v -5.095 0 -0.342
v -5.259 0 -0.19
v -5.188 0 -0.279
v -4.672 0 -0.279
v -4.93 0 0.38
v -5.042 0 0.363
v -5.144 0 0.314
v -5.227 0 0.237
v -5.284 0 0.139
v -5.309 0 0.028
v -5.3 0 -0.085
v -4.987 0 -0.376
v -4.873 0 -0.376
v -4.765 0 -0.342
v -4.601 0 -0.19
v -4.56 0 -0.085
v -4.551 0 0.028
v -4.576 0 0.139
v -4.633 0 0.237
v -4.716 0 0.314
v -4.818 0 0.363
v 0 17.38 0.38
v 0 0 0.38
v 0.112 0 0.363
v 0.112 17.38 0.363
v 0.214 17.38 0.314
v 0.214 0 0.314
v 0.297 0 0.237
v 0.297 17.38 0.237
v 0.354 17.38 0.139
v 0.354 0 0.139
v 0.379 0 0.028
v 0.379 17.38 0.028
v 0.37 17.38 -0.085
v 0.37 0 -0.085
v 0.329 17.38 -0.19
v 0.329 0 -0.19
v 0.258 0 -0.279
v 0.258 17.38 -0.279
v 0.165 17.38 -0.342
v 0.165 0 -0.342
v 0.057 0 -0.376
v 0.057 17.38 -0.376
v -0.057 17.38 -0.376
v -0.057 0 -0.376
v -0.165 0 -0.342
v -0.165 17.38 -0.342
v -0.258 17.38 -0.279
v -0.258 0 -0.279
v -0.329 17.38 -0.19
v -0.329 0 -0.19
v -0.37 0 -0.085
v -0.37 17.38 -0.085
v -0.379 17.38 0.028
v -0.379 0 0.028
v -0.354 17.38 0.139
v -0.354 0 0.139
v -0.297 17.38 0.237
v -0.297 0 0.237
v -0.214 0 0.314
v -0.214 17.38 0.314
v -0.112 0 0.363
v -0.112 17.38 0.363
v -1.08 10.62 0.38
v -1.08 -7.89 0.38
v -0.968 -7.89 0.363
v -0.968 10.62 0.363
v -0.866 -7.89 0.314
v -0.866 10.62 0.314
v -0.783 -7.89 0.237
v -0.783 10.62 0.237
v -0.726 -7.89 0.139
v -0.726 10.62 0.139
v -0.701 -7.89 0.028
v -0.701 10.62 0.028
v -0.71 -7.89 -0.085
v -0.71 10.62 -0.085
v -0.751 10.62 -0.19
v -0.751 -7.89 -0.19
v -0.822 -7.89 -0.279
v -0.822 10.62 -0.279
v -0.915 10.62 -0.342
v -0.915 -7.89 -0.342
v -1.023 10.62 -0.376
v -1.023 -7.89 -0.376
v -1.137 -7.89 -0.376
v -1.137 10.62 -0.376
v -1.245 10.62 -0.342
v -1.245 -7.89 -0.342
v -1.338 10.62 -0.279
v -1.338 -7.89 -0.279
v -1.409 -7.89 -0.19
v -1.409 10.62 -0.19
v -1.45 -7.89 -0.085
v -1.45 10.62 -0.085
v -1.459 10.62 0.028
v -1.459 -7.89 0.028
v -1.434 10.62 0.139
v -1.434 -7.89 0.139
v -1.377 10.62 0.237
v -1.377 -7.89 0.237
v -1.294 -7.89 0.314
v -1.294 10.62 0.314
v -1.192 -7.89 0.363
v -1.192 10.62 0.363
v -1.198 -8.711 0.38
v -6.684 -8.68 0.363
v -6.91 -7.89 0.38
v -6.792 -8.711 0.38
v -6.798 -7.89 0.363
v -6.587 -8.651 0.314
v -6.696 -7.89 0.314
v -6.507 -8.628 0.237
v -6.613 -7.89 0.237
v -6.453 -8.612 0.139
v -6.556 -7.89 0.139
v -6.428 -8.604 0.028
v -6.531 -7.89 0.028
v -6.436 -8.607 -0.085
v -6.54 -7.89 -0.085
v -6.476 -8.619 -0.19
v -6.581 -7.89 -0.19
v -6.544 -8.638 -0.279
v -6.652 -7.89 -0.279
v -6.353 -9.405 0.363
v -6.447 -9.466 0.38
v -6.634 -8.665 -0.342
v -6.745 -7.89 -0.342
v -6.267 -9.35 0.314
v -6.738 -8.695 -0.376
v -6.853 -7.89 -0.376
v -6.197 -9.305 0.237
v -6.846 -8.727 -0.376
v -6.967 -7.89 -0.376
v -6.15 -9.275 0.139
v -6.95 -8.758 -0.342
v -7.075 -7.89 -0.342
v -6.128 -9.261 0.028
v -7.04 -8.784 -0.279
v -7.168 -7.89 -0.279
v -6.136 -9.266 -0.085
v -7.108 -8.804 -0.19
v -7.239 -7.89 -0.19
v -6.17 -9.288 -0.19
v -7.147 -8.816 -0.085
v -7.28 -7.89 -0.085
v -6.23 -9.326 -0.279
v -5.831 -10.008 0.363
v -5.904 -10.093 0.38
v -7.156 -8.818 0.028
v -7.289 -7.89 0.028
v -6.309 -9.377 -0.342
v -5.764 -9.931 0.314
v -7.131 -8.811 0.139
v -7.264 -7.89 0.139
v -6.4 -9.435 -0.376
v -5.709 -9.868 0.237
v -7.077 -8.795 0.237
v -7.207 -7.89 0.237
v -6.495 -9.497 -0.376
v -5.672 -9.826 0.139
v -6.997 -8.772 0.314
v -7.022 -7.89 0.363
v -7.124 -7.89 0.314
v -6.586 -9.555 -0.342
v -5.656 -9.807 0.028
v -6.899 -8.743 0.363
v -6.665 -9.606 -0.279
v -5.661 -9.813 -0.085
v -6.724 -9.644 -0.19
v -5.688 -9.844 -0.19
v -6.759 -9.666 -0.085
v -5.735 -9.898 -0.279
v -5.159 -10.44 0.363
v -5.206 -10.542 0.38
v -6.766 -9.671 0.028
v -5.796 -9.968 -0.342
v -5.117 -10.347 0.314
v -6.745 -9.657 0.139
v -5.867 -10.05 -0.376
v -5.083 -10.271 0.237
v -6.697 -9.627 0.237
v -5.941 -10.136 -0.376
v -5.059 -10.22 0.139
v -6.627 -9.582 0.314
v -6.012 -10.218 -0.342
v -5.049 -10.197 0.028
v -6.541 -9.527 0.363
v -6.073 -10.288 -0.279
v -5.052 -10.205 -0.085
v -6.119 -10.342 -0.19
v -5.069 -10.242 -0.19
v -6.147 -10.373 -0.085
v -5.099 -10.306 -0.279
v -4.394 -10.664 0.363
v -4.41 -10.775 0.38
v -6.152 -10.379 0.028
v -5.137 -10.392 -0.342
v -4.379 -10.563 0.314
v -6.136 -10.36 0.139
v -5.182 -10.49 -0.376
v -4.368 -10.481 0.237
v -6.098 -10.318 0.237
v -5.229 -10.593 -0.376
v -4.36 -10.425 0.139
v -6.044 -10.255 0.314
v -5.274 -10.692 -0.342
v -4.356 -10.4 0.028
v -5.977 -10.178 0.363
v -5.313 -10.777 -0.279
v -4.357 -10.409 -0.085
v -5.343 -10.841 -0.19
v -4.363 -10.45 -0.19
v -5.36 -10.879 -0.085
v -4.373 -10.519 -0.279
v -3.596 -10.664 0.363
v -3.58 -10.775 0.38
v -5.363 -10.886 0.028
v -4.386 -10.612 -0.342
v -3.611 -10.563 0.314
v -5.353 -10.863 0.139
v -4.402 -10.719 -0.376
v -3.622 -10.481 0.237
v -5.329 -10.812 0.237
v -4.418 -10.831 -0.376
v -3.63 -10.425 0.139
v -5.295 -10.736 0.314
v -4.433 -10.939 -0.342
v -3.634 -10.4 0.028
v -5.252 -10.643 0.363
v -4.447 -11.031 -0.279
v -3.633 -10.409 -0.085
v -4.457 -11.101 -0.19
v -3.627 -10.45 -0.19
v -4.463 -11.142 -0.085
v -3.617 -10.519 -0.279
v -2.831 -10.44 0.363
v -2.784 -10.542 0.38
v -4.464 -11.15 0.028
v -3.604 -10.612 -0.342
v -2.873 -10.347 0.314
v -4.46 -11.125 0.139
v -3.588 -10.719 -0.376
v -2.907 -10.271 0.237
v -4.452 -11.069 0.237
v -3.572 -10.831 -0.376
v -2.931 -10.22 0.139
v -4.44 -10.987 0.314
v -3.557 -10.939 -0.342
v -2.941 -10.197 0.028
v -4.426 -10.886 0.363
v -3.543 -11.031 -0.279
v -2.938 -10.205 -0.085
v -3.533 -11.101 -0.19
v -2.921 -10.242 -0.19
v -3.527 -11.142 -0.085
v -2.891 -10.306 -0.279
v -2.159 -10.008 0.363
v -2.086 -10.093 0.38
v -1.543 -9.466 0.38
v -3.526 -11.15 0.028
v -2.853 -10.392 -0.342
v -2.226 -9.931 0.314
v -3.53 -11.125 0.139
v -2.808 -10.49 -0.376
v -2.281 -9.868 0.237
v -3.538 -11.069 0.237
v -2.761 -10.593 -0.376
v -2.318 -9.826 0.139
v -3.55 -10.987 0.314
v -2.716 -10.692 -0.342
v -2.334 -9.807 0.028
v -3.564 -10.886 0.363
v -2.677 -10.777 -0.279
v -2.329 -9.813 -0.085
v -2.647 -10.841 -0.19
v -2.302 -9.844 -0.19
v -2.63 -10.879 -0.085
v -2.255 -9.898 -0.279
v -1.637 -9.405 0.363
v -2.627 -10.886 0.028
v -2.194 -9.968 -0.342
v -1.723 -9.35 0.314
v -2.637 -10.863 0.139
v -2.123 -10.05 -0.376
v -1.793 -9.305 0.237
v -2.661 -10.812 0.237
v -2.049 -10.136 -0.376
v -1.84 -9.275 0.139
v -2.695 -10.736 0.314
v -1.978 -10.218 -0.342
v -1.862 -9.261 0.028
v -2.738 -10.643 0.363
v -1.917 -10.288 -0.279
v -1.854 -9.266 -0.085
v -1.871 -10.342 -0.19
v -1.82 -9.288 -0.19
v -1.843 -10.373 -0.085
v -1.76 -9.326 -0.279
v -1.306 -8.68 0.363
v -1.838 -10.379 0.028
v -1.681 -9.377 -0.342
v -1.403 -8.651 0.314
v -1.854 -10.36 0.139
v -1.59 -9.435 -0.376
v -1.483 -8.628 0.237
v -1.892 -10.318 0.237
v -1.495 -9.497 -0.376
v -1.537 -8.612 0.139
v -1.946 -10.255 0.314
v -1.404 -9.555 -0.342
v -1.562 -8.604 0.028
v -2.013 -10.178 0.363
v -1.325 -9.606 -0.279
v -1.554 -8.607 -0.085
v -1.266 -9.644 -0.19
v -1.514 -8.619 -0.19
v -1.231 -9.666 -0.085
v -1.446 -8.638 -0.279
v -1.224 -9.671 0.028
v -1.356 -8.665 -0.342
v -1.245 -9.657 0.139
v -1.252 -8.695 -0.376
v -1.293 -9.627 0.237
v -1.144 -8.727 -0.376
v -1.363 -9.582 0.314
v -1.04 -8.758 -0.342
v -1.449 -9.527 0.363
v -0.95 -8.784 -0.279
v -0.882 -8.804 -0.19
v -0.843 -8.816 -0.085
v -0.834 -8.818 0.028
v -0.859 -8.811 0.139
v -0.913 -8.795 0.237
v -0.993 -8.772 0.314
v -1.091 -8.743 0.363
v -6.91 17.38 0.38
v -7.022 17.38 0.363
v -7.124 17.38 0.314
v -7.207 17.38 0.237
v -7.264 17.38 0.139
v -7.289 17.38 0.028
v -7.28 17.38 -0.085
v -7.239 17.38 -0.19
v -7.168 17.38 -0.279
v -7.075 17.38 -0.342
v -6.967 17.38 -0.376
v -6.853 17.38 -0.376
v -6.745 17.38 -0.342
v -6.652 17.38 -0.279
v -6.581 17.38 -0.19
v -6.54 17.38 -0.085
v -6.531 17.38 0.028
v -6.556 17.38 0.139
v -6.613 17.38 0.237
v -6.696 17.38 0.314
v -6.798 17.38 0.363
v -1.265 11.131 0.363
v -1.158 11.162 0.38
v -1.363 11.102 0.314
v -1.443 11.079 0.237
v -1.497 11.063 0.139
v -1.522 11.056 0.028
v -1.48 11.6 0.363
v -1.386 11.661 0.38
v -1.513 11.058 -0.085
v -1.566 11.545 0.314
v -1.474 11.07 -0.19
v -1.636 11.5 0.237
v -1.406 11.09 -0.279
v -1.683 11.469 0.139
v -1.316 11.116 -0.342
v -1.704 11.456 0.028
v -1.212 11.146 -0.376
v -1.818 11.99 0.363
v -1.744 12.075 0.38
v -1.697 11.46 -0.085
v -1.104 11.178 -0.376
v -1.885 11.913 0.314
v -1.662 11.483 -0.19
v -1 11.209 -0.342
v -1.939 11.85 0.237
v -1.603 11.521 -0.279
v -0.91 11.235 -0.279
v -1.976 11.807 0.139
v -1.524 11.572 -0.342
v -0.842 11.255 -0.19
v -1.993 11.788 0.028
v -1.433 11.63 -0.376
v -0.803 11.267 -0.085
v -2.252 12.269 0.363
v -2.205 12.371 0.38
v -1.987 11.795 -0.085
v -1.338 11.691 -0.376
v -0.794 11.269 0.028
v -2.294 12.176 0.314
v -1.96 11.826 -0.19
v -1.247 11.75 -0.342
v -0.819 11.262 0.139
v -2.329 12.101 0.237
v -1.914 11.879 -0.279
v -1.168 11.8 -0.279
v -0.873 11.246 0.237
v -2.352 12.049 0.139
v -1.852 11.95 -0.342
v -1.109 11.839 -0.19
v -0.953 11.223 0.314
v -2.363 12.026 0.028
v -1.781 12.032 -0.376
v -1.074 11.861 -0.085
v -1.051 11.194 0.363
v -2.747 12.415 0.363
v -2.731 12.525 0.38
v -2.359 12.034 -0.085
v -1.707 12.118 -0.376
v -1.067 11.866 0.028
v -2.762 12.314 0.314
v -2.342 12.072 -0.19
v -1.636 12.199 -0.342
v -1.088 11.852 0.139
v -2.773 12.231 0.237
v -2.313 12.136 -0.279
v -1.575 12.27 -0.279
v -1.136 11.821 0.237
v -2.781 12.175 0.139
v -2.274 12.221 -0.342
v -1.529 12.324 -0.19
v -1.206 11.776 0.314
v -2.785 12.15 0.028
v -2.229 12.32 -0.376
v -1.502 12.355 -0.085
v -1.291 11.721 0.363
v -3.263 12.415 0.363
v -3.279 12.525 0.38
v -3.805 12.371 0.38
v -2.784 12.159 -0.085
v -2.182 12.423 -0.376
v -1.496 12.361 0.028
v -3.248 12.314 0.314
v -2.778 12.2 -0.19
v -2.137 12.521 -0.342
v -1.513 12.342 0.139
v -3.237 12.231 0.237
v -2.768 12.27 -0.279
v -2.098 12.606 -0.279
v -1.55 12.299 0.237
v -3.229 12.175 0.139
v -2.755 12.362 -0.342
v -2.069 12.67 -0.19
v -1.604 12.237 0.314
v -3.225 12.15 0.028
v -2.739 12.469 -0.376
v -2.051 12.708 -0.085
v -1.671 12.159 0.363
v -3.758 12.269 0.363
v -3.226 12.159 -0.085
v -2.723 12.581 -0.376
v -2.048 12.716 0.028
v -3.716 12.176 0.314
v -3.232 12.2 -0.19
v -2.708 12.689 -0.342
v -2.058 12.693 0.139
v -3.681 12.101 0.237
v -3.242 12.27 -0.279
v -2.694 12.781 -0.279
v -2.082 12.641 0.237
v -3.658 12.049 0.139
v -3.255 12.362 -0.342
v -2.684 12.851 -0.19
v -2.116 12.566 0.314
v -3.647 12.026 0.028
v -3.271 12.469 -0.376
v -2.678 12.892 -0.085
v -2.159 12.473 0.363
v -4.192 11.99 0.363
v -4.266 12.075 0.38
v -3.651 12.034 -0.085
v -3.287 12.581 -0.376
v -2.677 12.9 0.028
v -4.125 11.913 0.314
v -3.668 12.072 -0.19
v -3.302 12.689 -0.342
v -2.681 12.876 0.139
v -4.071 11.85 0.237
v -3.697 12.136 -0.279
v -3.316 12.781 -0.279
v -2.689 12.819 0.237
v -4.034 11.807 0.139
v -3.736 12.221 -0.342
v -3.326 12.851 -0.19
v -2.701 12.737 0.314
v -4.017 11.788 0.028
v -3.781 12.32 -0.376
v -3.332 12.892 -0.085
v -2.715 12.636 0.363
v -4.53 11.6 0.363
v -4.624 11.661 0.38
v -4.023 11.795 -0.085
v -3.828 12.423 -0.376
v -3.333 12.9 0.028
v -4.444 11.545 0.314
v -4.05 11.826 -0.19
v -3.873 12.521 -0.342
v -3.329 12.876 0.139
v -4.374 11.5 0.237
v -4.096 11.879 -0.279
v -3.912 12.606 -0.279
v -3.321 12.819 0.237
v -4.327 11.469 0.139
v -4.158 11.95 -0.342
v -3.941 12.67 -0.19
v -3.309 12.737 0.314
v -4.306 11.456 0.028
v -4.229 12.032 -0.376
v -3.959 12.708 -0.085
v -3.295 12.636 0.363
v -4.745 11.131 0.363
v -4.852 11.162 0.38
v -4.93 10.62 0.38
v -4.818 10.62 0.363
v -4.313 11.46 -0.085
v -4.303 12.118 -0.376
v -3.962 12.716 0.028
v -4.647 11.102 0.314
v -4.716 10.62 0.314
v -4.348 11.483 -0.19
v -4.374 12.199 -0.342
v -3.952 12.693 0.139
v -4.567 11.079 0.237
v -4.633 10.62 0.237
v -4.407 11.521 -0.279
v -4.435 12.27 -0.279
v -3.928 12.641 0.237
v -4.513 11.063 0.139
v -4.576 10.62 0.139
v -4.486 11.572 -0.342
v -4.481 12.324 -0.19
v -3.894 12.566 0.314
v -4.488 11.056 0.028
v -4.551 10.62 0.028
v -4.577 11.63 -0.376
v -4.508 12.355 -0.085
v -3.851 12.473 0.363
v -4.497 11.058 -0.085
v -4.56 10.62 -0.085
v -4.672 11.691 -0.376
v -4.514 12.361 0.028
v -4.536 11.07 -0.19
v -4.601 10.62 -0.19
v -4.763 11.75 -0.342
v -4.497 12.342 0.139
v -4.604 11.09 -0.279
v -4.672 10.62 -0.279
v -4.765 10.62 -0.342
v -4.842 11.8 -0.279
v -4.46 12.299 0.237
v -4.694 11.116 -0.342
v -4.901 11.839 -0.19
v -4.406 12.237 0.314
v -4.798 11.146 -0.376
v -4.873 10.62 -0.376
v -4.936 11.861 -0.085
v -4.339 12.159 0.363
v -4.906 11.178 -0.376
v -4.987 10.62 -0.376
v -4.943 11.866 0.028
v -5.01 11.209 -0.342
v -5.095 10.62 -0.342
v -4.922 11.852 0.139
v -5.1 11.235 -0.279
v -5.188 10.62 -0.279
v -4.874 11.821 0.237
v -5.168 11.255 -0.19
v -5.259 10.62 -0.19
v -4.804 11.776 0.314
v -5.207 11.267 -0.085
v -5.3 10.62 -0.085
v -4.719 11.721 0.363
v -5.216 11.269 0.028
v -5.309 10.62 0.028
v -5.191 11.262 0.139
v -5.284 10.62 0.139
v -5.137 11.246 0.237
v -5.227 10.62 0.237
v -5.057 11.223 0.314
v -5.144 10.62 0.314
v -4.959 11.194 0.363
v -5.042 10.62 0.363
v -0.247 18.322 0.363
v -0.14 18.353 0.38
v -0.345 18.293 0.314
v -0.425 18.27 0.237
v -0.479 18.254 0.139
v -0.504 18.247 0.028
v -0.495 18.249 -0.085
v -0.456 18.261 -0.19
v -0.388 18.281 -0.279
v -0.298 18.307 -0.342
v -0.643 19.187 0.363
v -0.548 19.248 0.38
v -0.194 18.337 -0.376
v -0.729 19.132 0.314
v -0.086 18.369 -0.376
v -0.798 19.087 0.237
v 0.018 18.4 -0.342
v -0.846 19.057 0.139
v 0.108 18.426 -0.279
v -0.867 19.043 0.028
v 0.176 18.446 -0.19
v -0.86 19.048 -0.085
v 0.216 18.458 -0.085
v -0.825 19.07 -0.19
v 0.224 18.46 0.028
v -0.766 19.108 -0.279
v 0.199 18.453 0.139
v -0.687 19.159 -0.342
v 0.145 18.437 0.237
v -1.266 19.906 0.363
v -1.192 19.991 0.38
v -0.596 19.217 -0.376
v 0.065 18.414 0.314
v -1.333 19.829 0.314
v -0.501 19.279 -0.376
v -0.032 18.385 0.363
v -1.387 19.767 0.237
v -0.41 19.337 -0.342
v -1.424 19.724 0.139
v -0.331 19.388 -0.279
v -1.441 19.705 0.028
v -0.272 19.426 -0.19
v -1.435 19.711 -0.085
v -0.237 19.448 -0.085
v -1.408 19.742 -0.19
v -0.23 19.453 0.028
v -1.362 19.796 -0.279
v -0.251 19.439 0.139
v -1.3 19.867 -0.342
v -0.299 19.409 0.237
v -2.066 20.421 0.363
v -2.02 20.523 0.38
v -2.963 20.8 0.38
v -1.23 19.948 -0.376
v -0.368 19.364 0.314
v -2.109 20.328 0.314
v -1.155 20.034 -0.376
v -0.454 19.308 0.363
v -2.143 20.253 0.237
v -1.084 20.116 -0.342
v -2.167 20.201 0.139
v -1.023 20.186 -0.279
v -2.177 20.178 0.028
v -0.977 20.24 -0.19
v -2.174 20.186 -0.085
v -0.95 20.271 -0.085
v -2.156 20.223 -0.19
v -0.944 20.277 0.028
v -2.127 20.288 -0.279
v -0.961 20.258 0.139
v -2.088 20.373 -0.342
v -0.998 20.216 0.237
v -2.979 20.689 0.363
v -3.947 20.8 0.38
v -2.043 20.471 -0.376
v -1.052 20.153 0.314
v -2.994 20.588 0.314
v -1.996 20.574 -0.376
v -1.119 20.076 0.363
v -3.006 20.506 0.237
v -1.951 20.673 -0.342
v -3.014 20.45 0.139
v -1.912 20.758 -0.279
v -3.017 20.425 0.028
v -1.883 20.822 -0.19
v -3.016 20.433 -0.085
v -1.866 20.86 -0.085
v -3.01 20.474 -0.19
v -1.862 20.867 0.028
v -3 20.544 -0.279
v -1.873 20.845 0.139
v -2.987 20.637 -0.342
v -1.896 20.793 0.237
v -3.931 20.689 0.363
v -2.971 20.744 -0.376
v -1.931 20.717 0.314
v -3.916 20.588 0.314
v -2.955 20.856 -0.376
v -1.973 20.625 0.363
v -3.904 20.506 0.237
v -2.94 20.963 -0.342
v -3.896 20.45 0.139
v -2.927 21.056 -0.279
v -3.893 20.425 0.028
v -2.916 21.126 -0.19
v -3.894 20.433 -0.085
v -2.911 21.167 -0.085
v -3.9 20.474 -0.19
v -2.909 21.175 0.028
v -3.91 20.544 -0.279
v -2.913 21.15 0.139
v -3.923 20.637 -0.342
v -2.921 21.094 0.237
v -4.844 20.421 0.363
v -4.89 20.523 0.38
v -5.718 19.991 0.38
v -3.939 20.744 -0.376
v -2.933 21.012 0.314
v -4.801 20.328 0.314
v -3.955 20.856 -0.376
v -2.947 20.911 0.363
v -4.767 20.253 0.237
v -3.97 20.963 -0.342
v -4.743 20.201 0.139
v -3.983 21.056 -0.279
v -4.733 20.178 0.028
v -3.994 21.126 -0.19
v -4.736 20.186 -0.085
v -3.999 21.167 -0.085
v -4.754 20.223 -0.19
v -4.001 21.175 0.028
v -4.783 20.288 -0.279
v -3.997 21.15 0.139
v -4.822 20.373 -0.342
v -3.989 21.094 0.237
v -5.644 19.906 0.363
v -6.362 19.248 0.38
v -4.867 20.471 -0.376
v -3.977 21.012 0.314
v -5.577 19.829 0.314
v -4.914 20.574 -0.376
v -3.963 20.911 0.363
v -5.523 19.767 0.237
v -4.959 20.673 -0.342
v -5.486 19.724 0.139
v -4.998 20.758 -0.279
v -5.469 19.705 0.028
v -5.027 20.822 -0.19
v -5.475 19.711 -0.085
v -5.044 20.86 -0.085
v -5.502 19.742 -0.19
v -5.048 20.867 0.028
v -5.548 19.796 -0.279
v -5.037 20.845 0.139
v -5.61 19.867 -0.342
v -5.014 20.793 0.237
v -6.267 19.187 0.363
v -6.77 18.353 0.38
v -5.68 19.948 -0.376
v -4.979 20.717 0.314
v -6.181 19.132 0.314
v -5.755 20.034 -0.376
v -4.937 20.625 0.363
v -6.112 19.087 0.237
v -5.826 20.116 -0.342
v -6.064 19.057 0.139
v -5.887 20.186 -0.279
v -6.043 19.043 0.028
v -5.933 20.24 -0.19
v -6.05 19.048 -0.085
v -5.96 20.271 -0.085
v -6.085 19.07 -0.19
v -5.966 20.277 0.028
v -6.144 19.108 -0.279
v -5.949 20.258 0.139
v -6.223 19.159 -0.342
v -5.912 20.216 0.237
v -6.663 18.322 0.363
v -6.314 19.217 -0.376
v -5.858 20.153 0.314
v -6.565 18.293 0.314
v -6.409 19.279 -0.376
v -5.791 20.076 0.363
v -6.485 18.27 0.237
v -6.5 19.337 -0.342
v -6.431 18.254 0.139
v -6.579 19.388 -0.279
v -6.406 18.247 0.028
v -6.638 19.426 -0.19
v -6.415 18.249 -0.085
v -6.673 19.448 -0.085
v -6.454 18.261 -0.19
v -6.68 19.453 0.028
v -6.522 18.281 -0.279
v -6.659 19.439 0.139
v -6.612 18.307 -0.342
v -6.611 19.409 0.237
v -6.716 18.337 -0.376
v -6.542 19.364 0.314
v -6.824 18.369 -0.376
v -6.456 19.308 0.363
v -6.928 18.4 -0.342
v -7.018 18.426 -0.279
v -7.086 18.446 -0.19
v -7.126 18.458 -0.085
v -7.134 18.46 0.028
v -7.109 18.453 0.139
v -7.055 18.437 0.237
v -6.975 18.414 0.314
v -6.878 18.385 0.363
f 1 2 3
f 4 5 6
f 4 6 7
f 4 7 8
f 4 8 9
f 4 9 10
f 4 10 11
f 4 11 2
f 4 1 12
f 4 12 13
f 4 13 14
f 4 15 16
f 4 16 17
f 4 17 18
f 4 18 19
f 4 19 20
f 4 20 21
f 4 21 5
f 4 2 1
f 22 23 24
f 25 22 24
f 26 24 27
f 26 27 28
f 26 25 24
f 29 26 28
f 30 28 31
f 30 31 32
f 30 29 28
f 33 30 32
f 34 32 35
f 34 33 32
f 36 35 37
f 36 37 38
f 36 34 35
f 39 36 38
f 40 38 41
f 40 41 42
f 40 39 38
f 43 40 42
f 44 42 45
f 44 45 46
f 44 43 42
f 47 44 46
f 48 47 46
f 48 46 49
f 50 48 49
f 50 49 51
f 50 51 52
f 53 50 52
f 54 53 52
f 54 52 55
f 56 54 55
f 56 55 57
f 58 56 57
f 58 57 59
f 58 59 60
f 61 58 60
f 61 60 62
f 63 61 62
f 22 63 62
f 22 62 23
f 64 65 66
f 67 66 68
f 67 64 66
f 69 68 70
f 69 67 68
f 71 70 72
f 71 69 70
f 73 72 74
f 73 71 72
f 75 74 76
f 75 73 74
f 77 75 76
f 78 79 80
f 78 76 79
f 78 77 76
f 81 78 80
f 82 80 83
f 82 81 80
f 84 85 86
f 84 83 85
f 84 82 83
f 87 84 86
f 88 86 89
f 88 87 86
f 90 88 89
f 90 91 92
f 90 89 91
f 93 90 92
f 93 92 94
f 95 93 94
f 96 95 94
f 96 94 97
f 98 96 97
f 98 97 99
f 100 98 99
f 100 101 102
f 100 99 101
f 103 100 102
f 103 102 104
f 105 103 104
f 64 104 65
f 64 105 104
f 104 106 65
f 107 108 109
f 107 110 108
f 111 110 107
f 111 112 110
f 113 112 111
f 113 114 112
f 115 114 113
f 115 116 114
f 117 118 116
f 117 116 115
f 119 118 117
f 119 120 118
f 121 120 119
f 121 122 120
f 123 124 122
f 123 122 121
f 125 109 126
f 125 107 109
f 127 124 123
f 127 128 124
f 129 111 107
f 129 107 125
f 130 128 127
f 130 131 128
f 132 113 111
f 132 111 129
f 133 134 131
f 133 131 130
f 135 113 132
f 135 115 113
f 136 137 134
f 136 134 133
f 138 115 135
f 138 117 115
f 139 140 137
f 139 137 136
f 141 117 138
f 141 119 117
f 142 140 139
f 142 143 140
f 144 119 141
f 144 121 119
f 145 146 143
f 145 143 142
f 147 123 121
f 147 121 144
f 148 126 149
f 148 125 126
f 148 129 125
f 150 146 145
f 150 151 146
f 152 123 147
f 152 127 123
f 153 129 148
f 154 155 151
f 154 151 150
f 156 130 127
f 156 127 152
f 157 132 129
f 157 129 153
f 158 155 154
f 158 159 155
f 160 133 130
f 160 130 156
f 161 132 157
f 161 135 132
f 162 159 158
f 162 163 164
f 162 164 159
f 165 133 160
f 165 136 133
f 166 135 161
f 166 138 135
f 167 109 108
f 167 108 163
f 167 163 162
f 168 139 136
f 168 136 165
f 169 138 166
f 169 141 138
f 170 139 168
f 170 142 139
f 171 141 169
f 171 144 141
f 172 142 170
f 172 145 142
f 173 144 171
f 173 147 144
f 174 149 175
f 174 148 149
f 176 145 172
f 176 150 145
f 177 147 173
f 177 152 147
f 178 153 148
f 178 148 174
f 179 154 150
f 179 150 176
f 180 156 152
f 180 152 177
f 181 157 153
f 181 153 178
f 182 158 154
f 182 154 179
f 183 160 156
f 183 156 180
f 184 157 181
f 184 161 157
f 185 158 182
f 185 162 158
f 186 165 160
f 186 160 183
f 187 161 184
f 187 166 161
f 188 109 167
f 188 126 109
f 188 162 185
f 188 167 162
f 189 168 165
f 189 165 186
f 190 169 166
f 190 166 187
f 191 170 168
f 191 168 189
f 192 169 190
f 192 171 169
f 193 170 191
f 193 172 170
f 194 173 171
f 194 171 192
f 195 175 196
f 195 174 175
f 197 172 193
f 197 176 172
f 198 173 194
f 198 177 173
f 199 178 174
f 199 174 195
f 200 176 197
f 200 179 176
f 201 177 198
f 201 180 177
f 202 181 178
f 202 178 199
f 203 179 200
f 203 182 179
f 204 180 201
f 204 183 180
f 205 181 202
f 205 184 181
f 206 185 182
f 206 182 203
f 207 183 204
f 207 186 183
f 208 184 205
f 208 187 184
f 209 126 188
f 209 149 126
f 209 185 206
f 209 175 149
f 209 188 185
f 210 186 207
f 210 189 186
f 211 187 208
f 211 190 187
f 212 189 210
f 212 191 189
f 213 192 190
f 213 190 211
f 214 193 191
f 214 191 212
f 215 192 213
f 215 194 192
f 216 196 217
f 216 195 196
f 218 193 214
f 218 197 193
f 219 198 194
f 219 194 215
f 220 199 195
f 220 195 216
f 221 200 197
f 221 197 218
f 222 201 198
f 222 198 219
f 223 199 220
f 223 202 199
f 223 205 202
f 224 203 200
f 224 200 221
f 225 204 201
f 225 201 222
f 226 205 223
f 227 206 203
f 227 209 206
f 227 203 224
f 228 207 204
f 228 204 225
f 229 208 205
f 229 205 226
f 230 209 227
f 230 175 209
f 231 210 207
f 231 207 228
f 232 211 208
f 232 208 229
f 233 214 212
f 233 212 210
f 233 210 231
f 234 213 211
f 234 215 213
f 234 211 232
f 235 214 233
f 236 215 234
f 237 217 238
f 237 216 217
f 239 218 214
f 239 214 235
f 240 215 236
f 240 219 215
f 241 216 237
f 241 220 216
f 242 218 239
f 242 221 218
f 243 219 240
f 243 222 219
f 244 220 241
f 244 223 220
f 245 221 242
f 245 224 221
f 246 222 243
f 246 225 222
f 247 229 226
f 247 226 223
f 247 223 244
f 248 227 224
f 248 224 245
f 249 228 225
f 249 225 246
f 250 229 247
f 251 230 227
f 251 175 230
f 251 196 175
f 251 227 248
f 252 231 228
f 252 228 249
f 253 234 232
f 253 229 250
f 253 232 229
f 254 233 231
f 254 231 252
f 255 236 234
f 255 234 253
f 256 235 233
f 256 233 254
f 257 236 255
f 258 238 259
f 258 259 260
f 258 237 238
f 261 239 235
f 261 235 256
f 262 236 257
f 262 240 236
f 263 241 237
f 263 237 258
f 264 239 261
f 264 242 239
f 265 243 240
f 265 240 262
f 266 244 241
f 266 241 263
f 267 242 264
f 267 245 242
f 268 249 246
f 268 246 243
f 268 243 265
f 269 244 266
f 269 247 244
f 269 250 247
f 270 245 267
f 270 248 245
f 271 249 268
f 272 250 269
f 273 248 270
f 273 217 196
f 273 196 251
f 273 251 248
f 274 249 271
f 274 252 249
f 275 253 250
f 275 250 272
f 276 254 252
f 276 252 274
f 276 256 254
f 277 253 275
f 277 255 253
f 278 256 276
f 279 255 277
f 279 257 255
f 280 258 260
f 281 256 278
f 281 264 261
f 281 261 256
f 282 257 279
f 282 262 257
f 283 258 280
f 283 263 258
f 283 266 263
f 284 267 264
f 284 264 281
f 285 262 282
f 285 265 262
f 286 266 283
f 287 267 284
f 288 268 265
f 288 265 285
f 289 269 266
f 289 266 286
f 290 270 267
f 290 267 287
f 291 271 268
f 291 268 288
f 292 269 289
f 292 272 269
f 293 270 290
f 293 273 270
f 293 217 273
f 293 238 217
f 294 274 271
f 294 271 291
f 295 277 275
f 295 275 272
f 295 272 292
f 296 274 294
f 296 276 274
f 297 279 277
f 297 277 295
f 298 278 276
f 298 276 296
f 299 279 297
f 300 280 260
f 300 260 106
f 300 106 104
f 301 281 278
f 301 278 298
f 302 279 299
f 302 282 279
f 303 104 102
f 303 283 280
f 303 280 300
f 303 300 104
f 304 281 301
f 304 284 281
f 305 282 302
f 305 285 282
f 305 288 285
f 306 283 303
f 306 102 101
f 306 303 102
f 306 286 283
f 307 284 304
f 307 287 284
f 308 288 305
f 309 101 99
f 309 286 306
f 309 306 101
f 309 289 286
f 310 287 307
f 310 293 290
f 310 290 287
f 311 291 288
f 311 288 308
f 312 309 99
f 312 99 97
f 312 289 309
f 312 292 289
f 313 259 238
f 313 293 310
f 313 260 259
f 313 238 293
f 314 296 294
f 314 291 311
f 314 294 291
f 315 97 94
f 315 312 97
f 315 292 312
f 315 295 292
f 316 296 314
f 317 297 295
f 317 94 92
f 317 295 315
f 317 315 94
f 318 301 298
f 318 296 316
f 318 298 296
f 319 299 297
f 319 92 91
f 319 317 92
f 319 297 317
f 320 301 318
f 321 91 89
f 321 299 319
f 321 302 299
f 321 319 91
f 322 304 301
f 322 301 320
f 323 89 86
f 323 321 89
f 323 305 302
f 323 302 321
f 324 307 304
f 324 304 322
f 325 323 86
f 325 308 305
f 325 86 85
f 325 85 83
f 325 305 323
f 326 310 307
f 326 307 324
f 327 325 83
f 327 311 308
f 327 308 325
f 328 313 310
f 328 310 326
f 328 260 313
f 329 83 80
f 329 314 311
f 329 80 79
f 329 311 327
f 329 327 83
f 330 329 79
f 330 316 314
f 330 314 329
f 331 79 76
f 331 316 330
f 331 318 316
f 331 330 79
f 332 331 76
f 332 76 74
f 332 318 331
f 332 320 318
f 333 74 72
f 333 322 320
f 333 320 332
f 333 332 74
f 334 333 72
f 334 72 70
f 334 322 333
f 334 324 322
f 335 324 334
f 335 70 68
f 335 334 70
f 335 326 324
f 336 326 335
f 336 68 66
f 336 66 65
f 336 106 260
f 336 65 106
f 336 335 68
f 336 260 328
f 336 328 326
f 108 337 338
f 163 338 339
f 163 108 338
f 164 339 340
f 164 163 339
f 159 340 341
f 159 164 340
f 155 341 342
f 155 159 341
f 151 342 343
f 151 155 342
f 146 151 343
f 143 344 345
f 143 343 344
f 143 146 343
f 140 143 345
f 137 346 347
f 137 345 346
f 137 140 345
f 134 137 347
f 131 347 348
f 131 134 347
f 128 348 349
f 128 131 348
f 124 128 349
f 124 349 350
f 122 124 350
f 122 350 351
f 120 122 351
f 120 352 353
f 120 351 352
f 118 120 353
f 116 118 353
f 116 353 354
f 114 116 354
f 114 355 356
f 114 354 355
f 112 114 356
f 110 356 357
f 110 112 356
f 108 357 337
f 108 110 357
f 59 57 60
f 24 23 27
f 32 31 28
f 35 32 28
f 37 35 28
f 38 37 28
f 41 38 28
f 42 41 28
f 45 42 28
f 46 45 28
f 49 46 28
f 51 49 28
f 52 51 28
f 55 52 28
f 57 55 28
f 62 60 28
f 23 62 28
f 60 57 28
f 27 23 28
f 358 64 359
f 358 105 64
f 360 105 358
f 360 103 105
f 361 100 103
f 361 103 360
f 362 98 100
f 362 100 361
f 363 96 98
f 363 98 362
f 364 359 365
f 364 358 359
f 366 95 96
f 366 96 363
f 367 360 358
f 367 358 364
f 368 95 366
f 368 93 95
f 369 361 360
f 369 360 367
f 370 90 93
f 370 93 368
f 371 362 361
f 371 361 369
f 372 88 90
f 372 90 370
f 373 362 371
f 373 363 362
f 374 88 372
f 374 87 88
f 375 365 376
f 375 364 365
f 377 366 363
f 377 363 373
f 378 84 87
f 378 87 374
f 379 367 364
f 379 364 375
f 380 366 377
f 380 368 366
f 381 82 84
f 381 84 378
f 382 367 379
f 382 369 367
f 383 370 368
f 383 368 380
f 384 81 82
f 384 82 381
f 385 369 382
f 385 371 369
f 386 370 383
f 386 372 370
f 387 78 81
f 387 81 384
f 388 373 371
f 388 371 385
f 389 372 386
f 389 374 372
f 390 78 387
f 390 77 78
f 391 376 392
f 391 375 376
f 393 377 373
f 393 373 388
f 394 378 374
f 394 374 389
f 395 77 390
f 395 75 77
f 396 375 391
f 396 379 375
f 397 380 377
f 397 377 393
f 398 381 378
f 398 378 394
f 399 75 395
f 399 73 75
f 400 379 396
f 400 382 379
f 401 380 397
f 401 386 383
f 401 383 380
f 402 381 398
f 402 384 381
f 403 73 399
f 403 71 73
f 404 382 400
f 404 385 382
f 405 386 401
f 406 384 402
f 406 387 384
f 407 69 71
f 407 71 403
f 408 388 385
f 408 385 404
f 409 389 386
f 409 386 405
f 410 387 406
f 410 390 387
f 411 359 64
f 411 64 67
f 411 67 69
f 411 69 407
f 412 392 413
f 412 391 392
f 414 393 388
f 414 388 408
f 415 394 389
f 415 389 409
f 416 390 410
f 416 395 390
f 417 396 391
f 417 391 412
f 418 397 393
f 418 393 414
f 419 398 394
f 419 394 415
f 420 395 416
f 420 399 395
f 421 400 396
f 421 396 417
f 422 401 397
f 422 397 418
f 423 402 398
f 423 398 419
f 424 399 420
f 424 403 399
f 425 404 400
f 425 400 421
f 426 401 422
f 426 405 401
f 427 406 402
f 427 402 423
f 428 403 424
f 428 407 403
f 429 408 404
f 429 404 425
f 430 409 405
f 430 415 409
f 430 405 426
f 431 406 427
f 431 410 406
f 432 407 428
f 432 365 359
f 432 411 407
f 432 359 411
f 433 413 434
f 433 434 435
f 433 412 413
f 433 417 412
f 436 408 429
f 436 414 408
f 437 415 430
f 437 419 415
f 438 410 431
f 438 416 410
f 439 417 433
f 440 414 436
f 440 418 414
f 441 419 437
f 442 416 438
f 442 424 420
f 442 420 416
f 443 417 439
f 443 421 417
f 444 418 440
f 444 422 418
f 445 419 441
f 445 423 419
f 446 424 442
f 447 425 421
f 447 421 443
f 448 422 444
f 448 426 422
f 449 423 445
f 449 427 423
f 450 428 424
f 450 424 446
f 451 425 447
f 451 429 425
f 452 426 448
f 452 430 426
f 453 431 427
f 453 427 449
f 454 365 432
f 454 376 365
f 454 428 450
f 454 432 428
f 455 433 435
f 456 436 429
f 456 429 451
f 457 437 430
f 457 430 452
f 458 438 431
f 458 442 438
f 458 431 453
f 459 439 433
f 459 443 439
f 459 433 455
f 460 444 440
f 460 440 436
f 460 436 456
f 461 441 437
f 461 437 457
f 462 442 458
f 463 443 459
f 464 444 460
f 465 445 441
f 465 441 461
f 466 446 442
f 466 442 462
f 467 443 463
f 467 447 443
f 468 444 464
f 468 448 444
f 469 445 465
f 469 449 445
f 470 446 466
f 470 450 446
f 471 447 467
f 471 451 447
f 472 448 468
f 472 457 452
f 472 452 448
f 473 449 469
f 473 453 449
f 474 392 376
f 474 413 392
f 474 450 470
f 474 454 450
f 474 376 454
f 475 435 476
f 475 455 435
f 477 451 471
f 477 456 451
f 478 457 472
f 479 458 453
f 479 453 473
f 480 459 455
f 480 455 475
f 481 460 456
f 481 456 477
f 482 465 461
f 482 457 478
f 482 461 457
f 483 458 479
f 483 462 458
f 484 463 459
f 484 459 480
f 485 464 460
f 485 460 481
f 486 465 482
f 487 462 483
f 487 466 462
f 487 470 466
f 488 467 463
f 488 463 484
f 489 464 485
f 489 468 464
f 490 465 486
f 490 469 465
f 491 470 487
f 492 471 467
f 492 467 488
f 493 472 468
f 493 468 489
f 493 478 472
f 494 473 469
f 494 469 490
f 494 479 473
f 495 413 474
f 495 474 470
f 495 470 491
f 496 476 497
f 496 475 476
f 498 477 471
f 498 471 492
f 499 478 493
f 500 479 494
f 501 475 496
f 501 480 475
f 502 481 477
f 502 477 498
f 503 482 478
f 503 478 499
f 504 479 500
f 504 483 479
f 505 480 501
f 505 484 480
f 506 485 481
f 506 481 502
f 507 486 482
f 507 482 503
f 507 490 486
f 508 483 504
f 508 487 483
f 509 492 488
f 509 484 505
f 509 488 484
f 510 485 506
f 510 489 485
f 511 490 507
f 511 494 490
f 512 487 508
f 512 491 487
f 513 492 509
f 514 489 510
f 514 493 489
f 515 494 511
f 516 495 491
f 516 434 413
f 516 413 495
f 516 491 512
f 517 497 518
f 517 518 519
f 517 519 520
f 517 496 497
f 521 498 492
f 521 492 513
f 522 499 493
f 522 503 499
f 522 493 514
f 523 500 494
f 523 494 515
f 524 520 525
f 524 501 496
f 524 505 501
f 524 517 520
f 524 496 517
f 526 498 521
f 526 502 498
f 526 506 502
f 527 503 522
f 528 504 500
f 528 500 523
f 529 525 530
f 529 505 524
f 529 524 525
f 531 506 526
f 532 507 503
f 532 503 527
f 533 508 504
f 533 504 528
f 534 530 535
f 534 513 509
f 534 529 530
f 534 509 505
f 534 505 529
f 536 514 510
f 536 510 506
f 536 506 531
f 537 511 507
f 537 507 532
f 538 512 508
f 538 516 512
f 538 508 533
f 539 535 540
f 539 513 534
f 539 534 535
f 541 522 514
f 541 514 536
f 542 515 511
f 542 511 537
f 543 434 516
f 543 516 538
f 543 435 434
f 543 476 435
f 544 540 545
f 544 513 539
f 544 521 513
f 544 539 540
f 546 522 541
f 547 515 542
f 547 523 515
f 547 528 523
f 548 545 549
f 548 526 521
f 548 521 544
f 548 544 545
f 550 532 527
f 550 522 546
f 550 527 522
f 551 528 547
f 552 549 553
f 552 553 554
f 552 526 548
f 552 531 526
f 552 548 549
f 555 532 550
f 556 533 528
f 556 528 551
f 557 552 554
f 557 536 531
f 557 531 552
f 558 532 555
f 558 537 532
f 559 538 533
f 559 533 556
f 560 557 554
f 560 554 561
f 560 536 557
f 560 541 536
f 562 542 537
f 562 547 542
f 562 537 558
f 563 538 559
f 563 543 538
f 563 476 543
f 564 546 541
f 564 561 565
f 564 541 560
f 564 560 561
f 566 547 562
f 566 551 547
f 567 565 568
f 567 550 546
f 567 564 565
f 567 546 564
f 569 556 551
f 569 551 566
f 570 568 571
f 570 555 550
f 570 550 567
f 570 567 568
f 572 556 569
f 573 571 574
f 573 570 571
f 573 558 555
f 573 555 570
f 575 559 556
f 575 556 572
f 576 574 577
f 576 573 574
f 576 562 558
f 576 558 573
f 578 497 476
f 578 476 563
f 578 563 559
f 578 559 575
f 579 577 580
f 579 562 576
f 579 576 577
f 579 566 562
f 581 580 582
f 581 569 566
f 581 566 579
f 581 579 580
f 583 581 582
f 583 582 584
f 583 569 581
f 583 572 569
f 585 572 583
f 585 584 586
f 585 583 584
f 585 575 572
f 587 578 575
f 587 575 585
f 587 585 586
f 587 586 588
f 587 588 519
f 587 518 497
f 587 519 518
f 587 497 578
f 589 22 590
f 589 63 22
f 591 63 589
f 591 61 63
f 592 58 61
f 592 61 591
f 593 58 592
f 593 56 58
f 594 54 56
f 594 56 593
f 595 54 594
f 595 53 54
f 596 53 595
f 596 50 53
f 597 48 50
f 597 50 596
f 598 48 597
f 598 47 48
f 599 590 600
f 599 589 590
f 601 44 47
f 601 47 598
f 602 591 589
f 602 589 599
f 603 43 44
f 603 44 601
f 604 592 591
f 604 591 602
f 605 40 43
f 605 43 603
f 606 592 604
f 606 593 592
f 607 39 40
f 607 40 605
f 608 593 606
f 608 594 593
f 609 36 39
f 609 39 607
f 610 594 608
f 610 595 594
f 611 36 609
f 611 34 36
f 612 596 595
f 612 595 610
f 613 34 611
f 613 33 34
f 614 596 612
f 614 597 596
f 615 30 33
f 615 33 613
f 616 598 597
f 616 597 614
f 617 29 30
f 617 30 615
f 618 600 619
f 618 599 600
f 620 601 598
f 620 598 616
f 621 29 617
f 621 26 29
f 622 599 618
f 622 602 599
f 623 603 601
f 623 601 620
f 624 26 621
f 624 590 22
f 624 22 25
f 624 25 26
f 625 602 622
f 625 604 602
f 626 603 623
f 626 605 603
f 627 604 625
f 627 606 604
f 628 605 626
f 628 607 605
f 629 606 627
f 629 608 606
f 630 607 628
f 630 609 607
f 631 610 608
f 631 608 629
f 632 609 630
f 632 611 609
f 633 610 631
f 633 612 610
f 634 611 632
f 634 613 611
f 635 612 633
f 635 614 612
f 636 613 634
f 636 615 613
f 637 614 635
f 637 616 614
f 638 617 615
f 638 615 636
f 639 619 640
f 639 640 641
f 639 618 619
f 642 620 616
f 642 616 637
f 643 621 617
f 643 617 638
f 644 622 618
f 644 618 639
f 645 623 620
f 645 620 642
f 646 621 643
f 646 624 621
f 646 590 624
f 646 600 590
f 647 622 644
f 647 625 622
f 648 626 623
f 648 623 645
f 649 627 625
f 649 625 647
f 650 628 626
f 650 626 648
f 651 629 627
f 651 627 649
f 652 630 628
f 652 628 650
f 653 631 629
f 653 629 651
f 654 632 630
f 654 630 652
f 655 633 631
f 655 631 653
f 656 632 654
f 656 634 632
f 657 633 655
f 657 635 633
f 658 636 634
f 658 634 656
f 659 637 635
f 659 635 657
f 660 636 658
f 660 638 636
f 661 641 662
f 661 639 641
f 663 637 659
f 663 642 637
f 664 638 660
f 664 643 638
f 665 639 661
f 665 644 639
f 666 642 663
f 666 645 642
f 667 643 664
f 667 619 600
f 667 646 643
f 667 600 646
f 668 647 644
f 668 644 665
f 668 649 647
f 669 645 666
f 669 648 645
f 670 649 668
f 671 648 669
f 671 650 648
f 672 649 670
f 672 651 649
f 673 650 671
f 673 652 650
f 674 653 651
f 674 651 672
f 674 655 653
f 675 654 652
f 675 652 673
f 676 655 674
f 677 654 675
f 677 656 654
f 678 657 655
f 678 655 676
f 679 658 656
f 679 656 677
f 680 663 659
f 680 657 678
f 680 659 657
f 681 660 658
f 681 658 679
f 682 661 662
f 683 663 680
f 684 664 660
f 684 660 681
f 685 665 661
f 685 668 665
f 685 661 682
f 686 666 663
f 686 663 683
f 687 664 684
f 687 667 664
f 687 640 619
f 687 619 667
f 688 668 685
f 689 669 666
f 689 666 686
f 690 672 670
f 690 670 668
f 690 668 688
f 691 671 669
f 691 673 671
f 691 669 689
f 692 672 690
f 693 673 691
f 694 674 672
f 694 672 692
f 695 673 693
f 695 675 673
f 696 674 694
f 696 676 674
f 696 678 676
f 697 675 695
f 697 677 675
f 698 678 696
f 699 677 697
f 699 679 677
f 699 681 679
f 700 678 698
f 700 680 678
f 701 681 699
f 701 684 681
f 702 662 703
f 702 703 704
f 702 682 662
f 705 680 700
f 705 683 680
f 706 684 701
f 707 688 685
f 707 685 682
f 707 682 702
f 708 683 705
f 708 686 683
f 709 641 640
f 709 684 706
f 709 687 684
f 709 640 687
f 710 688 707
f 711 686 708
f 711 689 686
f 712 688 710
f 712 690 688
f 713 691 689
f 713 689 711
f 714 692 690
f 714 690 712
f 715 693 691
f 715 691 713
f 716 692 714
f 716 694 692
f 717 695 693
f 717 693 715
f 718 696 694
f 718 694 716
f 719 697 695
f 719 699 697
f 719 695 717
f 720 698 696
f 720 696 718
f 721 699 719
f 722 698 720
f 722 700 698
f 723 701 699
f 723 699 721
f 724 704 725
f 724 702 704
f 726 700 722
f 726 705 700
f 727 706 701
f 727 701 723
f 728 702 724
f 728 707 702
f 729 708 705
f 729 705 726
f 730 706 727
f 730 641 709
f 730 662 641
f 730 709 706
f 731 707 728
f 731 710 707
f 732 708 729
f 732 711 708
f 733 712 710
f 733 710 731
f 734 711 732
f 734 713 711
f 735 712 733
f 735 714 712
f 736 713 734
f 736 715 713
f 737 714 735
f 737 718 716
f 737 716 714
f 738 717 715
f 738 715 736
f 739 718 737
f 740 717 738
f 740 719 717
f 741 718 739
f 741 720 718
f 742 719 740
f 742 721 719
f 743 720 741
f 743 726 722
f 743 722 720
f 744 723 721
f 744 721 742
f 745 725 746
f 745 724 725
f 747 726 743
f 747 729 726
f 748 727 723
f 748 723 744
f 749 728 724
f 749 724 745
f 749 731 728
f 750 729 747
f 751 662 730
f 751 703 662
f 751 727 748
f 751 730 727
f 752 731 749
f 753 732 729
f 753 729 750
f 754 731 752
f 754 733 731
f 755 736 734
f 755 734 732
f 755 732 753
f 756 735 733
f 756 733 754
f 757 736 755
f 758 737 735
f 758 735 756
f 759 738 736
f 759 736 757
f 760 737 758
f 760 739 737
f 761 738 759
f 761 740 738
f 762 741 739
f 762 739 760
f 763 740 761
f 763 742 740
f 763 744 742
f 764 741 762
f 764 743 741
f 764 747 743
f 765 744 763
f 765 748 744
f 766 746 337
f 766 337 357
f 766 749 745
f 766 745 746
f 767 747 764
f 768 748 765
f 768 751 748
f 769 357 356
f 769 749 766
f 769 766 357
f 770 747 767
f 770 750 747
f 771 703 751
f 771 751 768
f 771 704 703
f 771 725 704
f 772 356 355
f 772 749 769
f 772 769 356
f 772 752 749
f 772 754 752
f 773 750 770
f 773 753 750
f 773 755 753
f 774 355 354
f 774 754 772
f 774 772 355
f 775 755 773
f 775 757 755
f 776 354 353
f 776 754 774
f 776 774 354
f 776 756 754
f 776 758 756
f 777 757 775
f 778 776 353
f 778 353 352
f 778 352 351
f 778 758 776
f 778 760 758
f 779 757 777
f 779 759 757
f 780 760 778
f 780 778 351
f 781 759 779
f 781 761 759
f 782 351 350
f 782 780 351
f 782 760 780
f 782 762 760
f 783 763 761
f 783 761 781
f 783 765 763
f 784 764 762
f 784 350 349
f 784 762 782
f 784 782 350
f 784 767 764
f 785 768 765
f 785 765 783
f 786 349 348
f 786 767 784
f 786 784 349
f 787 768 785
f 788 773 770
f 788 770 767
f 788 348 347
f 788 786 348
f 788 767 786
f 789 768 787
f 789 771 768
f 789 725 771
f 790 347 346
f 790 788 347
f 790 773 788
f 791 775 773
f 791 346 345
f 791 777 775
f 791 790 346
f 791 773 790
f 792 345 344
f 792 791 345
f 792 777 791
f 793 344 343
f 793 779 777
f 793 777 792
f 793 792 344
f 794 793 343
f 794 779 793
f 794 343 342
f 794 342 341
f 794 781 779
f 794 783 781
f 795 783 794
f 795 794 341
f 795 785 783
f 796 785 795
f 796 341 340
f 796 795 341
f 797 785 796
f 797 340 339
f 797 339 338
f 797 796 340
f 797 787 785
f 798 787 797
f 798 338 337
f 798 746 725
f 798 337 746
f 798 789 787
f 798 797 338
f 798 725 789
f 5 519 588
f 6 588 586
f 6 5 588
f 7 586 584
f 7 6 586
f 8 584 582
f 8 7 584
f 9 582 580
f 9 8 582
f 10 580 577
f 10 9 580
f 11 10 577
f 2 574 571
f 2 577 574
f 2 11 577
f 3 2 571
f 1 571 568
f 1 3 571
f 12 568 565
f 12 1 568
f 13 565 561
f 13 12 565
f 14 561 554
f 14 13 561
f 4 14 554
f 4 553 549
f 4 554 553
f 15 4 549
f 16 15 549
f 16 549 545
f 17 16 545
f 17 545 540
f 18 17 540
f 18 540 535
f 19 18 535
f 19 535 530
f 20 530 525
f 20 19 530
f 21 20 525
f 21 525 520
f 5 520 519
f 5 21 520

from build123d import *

# Parameters (mm, degrees)
SWEEP1_PROFILE_R = 0.38


with BuildPart() as part:
    # Sweep1: sweep along a path in Sketch1
    with BuildLine(Plane.XY) as sweep1_path:
        Line((0, 0), (0, 17.38))
        ThreePointArc((0, 17.38), (-3.455, 20.835), (-6.91, 17.38))
        Line((-6.91, 17.38), (-6.91, -7.89))
        ThreePointArc((-6.91, -7.89), (-3.995, -10.805), (-1.08, -7.89))
        Line((-1.08, -7.89), (-1.08, 10.62))
        ThreePointArc((-1.08, 10.62), (-3.005, 12.545), (-4.93, 10.62))
        Line((-4.93, 10.62), (-4.93, 0))
    # Sweep1 profile (on start of the path) → Sweep1 (sweep)
    with BuildSketch(Plane.ZX):
        Circle(SWEEP1_PROFILE_R)
    sweep(path=sweep1_path.line)


solid = part.part
